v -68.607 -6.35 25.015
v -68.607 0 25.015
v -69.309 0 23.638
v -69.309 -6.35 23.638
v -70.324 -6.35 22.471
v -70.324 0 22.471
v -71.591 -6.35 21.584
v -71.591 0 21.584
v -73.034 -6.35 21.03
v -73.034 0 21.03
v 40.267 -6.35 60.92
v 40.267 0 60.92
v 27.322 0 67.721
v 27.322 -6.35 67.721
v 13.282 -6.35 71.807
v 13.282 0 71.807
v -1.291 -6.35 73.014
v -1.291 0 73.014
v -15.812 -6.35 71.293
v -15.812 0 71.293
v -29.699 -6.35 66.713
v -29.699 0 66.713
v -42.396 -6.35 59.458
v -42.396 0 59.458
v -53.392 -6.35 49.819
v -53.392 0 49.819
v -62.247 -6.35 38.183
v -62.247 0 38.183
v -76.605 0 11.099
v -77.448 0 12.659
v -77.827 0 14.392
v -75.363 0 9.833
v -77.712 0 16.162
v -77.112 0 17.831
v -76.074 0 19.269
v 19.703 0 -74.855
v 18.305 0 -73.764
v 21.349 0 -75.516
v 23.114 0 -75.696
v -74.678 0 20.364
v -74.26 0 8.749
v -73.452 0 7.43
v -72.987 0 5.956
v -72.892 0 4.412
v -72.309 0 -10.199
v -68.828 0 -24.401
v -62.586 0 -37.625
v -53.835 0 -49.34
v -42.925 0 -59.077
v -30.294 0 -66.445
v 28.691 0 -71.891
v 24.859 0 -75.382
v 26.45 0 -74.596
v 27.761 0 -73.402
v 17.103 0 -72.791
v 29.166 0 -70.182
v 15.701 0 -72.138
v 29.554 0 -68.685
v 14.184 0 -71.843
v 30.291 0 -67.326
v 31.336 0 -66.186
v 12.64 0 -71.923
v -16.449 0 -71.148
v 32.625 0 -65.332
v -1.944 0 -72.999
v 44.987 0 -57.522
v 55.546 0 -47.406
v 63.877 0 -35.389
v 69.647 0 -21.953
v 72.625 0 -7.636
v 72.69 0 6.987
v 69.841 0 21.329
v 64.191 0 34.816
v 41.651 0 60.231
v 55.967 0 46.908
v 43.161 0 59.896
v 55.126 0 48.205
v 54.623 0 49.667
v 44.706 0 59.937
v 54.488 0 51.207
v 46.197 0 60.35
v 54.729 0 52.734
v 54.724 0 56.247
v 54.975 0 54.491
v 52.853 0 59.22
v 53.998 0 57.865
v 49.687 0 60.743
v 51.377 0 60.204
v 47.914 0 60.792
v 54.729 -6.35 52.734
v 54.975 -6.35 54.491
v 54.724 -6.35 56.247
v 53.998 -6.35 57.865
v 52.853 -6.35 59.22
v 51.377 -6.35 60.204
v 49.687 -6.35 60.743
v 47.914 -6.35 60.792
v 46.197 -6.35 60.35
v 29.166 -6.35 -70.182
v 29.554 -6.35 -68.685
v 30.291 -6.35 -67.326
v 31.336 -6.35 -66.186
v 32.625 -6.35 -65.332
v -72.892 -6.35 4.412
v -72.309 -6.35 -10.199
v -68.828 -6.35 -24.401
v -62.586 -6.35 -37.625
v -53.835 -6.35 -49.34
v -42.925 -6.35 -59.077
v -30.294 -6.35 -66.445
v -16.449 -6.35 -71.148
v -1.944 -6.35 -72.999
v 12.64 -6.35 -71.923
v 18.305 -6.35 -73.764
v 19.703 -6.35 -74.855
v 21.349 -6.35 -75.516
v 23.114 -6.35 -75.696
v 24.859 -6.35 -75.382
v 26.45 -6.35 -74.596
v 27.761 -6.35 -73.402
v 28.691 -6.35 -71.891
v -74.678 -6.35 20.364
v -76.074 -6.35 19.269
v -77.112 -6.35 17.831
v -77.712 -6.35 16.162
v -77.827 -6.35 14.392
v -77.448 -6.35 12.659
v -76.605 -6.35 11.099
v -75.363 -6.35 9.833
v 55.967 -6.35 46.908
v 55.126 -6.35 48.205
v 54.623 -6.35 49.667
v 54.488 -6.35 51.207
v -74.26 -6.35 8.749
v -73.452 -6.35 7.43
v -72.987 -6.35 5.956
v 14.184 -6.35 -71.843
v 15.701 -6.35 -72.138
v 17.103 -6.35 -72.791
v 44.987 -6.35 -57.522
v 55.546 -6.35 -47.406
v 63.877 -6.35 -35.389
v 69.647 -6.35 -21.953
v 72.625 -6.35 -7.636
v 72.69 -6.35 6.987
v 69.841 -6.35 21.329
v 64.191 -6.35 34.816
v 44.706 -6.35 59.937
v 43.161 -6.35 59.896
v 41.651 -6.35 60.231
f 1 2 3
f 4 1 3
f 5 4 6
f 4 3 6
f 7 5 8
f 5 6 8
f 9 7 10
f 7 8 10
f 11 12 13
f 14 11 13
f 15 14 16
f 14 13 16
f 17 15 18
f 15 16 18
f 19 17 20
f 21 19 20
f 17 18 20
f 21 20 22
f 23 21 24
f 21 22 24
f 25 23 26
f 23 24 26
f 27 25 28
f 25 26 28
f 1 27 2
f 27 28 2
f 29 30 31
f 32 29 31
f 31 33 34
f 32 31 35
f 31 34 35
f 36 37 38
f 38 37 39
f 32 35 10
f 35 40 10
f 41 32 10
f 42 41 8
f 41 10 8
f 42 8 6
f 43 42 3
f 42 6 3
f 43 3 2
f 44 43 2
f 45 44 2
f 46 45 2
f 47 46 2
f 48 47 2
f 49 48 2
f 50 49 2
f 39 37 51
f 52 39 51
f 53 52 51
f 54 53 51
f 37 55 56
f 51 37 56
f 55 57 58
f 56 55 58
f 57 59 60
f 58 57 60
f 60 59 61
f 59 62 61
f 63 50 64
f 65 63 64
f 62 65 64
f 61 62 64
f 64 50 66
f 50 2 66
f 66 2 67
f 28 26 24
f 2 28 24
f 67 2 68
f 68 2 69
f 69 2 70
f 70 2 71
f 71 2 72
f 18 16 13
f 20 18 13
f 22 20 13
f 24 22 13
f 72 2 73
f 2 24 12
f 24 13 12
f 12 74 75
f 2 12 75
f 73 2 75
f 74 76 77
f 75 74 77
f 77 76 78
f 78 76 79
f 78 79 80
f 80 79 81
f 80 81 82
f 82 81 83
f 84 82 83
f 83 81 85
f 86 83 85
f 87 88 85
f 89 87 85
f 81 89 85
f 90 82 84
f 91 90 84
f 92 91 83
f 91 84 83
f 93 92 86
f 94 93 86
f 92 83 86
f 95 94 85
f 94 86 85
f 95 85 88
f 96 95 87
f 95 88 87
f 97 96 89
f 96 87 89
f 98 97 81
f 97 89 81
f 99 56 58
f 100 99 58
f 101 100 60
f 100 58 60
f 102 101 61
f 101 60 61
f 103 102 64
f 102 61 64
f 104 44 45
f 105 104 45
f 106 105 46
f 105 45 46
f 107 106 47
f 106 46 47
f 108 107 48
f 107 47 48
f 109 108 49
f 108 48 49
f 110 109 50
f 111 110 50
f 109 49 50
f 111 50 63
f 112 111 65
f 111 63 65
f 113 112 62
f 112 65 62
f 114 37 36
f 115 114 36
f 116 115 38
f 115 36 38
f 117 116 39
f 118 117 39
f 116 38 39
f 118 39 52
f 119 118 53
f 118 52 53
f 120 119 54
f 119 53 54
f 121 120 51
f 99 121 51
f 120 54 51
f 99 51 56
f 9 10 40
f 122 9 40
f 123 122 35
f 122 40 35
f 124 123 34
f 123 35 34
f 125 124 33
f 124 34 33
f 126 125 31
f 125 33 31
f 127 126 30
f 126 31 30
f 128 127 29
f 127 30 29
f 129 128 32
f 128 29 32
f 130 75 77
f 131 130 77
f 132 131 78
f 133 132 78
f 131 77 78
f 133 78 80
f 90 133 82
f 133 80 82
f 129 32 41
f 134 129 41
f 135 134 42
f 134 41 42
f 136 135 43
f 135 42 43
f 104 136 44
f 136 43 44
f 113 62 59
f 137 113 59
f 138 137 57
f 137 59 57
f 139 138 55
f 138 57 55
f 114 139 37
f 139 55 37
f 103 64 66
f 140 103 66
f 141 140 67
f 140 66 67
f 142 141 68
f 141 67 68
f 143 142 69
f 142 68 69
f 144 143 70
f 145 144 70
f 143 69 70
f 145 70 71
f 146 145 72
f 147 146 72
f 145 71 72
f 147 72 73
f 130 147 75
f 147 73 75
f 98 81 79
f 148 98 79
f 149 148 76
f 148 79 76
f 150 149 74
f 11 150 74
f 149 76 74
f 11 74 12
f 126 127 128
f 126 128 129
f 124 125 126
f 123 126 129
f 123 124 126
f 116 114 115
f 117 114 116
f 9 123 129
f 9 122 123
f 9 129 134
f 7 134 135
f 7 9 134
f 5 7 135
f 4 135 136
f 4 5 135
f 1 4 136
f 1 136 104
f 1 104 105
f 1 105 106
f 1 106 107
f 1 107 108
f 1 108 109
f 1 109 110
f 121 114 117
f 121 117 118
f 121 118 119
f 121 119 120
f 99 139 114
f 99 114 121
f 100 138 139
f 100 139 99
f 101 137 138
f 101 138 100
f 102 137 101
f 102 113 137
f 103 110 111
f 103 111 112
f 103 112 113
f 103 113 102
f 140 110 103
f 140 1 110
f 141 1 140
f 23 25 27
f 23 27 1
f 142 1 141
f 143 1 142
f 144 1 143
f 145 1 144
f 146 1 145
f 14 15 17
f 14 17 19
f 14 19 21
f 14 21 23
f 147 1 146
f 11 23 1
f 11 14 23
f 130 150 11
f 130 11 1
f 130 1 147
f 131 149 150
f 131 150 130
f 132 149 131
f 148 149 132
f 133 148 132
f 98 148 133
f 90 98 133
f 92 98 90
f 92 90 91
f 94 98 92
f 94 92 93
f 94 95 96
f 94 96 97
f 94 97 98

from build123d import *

# Parameters (mm, degrees)
F1_DEPTH = 6.35
F2_DEPTH = 6.35


with BuildPart() as f1:
    # F0 (on Front) → F1 (new body)
    with BuildSketch(Plane.XZ):
        with BuildLine():
            ThreePointArc((46.19652, 60.349645), (43.160779, 59.896273), (40.267036, 60.919754))
            ThreePointArc((40.267036, 60.919754), (-22.87068, 69.351155), (-68.606756, 25.015267))
            ThreePointArc((-68.606756, 25.015267), (-70.323983, 22.471177), (-73.033881, 21.029748))
            ThreePointArc((-73.033881, 21.029748), (-77.712175, 16.161943), (-75.362586, 9.832537))
            ThreePointArc((-75.362586, 9.832537), (-73.452084, 7.430195), (-72.891573, 4.412399))
            ThreePointArc((-72.891573, 4.412399), (-48.624522, -54.482167), (12.639521, -71.922828))
            ThreePointArc((12.639521, -71.922828), (15.701382, -72.137945), (18.304645, -73.764071))
            ThreePointArc((18.304645, -73.764071), (24.859434, -75.38169), (29.166066, -70.182182))
            ThreePointArc((29.166066, -70.182182), (30.291304, -67.326468), (32.624537, -65.332153))
            ThreePointArc((32.624537, -65.332153), (71.495201, -14.868988), (55.967235, 46.90756))
            ThreePointArc((55.967235, 46.90756), (54.622602, 49.666768), (54.729237, 52.734323))
            ThreePointArc((54.729237, 52.734323), (52.852741, 59.219747), (46.19652, 60.349645))
        make_face()
    extrude(amount=F1_DEPTH)

    # F0 (on Front) → F2 (join)
    with BuildSketch(Plane.XZ):
        with BuildLine():
            ThreePointArc((46.19652, 60.349645), (43.160779, 59.896273), (40.267036, 60.919754))
            ThreePointArc((40.267036, 60.919754), (-22.87068, 69.351155), (-68.606756, 25.015267))
            ThreePointArc((-68.606756, 25.015267), (-70.323983, 22.471177), (-73.033881, 21.029748))
            ThreePointArc((-73.033881, 21.029748), (-77.712175, 16.161943), (-75.362586, 9.832537))
            ThreePointArc((-75.362586, 9.832537), (-73.452084, 7.430195), (-72.891573, 4.412399))
            ThreePointArc((-72.891573, 4.412399), (-48.624522, -54.482167), (12.639521, -71.922828))
            ThreePointArc((12.639521, -71.922828), (15.701382, -72.137945), (18.304645, -73.764071))
            ThreePointArc((18.304645, -73.764071), (24.859434, -75.38169), (29.166066, -70.182182))
            ThreePointArc((29.166066, -70.182182), (30.291304, -67.326468), (32.624537, -65.332153))
            ThreePointArc((32.624537, -65.332153), (71.495201, -14.868988), (55.967235, 46.90756))
            ThreePointArc((55.967235, 46.90756), (54.622602, 49.666768), (54.729237, 52.734323))
            ThreePointArc((54.729237, 52.734323), (52.852741, 59.219747), (46.19652, 60.349645))
        make_face()
    extrude(amount=F2_DEPTH)


solid = f1.part
